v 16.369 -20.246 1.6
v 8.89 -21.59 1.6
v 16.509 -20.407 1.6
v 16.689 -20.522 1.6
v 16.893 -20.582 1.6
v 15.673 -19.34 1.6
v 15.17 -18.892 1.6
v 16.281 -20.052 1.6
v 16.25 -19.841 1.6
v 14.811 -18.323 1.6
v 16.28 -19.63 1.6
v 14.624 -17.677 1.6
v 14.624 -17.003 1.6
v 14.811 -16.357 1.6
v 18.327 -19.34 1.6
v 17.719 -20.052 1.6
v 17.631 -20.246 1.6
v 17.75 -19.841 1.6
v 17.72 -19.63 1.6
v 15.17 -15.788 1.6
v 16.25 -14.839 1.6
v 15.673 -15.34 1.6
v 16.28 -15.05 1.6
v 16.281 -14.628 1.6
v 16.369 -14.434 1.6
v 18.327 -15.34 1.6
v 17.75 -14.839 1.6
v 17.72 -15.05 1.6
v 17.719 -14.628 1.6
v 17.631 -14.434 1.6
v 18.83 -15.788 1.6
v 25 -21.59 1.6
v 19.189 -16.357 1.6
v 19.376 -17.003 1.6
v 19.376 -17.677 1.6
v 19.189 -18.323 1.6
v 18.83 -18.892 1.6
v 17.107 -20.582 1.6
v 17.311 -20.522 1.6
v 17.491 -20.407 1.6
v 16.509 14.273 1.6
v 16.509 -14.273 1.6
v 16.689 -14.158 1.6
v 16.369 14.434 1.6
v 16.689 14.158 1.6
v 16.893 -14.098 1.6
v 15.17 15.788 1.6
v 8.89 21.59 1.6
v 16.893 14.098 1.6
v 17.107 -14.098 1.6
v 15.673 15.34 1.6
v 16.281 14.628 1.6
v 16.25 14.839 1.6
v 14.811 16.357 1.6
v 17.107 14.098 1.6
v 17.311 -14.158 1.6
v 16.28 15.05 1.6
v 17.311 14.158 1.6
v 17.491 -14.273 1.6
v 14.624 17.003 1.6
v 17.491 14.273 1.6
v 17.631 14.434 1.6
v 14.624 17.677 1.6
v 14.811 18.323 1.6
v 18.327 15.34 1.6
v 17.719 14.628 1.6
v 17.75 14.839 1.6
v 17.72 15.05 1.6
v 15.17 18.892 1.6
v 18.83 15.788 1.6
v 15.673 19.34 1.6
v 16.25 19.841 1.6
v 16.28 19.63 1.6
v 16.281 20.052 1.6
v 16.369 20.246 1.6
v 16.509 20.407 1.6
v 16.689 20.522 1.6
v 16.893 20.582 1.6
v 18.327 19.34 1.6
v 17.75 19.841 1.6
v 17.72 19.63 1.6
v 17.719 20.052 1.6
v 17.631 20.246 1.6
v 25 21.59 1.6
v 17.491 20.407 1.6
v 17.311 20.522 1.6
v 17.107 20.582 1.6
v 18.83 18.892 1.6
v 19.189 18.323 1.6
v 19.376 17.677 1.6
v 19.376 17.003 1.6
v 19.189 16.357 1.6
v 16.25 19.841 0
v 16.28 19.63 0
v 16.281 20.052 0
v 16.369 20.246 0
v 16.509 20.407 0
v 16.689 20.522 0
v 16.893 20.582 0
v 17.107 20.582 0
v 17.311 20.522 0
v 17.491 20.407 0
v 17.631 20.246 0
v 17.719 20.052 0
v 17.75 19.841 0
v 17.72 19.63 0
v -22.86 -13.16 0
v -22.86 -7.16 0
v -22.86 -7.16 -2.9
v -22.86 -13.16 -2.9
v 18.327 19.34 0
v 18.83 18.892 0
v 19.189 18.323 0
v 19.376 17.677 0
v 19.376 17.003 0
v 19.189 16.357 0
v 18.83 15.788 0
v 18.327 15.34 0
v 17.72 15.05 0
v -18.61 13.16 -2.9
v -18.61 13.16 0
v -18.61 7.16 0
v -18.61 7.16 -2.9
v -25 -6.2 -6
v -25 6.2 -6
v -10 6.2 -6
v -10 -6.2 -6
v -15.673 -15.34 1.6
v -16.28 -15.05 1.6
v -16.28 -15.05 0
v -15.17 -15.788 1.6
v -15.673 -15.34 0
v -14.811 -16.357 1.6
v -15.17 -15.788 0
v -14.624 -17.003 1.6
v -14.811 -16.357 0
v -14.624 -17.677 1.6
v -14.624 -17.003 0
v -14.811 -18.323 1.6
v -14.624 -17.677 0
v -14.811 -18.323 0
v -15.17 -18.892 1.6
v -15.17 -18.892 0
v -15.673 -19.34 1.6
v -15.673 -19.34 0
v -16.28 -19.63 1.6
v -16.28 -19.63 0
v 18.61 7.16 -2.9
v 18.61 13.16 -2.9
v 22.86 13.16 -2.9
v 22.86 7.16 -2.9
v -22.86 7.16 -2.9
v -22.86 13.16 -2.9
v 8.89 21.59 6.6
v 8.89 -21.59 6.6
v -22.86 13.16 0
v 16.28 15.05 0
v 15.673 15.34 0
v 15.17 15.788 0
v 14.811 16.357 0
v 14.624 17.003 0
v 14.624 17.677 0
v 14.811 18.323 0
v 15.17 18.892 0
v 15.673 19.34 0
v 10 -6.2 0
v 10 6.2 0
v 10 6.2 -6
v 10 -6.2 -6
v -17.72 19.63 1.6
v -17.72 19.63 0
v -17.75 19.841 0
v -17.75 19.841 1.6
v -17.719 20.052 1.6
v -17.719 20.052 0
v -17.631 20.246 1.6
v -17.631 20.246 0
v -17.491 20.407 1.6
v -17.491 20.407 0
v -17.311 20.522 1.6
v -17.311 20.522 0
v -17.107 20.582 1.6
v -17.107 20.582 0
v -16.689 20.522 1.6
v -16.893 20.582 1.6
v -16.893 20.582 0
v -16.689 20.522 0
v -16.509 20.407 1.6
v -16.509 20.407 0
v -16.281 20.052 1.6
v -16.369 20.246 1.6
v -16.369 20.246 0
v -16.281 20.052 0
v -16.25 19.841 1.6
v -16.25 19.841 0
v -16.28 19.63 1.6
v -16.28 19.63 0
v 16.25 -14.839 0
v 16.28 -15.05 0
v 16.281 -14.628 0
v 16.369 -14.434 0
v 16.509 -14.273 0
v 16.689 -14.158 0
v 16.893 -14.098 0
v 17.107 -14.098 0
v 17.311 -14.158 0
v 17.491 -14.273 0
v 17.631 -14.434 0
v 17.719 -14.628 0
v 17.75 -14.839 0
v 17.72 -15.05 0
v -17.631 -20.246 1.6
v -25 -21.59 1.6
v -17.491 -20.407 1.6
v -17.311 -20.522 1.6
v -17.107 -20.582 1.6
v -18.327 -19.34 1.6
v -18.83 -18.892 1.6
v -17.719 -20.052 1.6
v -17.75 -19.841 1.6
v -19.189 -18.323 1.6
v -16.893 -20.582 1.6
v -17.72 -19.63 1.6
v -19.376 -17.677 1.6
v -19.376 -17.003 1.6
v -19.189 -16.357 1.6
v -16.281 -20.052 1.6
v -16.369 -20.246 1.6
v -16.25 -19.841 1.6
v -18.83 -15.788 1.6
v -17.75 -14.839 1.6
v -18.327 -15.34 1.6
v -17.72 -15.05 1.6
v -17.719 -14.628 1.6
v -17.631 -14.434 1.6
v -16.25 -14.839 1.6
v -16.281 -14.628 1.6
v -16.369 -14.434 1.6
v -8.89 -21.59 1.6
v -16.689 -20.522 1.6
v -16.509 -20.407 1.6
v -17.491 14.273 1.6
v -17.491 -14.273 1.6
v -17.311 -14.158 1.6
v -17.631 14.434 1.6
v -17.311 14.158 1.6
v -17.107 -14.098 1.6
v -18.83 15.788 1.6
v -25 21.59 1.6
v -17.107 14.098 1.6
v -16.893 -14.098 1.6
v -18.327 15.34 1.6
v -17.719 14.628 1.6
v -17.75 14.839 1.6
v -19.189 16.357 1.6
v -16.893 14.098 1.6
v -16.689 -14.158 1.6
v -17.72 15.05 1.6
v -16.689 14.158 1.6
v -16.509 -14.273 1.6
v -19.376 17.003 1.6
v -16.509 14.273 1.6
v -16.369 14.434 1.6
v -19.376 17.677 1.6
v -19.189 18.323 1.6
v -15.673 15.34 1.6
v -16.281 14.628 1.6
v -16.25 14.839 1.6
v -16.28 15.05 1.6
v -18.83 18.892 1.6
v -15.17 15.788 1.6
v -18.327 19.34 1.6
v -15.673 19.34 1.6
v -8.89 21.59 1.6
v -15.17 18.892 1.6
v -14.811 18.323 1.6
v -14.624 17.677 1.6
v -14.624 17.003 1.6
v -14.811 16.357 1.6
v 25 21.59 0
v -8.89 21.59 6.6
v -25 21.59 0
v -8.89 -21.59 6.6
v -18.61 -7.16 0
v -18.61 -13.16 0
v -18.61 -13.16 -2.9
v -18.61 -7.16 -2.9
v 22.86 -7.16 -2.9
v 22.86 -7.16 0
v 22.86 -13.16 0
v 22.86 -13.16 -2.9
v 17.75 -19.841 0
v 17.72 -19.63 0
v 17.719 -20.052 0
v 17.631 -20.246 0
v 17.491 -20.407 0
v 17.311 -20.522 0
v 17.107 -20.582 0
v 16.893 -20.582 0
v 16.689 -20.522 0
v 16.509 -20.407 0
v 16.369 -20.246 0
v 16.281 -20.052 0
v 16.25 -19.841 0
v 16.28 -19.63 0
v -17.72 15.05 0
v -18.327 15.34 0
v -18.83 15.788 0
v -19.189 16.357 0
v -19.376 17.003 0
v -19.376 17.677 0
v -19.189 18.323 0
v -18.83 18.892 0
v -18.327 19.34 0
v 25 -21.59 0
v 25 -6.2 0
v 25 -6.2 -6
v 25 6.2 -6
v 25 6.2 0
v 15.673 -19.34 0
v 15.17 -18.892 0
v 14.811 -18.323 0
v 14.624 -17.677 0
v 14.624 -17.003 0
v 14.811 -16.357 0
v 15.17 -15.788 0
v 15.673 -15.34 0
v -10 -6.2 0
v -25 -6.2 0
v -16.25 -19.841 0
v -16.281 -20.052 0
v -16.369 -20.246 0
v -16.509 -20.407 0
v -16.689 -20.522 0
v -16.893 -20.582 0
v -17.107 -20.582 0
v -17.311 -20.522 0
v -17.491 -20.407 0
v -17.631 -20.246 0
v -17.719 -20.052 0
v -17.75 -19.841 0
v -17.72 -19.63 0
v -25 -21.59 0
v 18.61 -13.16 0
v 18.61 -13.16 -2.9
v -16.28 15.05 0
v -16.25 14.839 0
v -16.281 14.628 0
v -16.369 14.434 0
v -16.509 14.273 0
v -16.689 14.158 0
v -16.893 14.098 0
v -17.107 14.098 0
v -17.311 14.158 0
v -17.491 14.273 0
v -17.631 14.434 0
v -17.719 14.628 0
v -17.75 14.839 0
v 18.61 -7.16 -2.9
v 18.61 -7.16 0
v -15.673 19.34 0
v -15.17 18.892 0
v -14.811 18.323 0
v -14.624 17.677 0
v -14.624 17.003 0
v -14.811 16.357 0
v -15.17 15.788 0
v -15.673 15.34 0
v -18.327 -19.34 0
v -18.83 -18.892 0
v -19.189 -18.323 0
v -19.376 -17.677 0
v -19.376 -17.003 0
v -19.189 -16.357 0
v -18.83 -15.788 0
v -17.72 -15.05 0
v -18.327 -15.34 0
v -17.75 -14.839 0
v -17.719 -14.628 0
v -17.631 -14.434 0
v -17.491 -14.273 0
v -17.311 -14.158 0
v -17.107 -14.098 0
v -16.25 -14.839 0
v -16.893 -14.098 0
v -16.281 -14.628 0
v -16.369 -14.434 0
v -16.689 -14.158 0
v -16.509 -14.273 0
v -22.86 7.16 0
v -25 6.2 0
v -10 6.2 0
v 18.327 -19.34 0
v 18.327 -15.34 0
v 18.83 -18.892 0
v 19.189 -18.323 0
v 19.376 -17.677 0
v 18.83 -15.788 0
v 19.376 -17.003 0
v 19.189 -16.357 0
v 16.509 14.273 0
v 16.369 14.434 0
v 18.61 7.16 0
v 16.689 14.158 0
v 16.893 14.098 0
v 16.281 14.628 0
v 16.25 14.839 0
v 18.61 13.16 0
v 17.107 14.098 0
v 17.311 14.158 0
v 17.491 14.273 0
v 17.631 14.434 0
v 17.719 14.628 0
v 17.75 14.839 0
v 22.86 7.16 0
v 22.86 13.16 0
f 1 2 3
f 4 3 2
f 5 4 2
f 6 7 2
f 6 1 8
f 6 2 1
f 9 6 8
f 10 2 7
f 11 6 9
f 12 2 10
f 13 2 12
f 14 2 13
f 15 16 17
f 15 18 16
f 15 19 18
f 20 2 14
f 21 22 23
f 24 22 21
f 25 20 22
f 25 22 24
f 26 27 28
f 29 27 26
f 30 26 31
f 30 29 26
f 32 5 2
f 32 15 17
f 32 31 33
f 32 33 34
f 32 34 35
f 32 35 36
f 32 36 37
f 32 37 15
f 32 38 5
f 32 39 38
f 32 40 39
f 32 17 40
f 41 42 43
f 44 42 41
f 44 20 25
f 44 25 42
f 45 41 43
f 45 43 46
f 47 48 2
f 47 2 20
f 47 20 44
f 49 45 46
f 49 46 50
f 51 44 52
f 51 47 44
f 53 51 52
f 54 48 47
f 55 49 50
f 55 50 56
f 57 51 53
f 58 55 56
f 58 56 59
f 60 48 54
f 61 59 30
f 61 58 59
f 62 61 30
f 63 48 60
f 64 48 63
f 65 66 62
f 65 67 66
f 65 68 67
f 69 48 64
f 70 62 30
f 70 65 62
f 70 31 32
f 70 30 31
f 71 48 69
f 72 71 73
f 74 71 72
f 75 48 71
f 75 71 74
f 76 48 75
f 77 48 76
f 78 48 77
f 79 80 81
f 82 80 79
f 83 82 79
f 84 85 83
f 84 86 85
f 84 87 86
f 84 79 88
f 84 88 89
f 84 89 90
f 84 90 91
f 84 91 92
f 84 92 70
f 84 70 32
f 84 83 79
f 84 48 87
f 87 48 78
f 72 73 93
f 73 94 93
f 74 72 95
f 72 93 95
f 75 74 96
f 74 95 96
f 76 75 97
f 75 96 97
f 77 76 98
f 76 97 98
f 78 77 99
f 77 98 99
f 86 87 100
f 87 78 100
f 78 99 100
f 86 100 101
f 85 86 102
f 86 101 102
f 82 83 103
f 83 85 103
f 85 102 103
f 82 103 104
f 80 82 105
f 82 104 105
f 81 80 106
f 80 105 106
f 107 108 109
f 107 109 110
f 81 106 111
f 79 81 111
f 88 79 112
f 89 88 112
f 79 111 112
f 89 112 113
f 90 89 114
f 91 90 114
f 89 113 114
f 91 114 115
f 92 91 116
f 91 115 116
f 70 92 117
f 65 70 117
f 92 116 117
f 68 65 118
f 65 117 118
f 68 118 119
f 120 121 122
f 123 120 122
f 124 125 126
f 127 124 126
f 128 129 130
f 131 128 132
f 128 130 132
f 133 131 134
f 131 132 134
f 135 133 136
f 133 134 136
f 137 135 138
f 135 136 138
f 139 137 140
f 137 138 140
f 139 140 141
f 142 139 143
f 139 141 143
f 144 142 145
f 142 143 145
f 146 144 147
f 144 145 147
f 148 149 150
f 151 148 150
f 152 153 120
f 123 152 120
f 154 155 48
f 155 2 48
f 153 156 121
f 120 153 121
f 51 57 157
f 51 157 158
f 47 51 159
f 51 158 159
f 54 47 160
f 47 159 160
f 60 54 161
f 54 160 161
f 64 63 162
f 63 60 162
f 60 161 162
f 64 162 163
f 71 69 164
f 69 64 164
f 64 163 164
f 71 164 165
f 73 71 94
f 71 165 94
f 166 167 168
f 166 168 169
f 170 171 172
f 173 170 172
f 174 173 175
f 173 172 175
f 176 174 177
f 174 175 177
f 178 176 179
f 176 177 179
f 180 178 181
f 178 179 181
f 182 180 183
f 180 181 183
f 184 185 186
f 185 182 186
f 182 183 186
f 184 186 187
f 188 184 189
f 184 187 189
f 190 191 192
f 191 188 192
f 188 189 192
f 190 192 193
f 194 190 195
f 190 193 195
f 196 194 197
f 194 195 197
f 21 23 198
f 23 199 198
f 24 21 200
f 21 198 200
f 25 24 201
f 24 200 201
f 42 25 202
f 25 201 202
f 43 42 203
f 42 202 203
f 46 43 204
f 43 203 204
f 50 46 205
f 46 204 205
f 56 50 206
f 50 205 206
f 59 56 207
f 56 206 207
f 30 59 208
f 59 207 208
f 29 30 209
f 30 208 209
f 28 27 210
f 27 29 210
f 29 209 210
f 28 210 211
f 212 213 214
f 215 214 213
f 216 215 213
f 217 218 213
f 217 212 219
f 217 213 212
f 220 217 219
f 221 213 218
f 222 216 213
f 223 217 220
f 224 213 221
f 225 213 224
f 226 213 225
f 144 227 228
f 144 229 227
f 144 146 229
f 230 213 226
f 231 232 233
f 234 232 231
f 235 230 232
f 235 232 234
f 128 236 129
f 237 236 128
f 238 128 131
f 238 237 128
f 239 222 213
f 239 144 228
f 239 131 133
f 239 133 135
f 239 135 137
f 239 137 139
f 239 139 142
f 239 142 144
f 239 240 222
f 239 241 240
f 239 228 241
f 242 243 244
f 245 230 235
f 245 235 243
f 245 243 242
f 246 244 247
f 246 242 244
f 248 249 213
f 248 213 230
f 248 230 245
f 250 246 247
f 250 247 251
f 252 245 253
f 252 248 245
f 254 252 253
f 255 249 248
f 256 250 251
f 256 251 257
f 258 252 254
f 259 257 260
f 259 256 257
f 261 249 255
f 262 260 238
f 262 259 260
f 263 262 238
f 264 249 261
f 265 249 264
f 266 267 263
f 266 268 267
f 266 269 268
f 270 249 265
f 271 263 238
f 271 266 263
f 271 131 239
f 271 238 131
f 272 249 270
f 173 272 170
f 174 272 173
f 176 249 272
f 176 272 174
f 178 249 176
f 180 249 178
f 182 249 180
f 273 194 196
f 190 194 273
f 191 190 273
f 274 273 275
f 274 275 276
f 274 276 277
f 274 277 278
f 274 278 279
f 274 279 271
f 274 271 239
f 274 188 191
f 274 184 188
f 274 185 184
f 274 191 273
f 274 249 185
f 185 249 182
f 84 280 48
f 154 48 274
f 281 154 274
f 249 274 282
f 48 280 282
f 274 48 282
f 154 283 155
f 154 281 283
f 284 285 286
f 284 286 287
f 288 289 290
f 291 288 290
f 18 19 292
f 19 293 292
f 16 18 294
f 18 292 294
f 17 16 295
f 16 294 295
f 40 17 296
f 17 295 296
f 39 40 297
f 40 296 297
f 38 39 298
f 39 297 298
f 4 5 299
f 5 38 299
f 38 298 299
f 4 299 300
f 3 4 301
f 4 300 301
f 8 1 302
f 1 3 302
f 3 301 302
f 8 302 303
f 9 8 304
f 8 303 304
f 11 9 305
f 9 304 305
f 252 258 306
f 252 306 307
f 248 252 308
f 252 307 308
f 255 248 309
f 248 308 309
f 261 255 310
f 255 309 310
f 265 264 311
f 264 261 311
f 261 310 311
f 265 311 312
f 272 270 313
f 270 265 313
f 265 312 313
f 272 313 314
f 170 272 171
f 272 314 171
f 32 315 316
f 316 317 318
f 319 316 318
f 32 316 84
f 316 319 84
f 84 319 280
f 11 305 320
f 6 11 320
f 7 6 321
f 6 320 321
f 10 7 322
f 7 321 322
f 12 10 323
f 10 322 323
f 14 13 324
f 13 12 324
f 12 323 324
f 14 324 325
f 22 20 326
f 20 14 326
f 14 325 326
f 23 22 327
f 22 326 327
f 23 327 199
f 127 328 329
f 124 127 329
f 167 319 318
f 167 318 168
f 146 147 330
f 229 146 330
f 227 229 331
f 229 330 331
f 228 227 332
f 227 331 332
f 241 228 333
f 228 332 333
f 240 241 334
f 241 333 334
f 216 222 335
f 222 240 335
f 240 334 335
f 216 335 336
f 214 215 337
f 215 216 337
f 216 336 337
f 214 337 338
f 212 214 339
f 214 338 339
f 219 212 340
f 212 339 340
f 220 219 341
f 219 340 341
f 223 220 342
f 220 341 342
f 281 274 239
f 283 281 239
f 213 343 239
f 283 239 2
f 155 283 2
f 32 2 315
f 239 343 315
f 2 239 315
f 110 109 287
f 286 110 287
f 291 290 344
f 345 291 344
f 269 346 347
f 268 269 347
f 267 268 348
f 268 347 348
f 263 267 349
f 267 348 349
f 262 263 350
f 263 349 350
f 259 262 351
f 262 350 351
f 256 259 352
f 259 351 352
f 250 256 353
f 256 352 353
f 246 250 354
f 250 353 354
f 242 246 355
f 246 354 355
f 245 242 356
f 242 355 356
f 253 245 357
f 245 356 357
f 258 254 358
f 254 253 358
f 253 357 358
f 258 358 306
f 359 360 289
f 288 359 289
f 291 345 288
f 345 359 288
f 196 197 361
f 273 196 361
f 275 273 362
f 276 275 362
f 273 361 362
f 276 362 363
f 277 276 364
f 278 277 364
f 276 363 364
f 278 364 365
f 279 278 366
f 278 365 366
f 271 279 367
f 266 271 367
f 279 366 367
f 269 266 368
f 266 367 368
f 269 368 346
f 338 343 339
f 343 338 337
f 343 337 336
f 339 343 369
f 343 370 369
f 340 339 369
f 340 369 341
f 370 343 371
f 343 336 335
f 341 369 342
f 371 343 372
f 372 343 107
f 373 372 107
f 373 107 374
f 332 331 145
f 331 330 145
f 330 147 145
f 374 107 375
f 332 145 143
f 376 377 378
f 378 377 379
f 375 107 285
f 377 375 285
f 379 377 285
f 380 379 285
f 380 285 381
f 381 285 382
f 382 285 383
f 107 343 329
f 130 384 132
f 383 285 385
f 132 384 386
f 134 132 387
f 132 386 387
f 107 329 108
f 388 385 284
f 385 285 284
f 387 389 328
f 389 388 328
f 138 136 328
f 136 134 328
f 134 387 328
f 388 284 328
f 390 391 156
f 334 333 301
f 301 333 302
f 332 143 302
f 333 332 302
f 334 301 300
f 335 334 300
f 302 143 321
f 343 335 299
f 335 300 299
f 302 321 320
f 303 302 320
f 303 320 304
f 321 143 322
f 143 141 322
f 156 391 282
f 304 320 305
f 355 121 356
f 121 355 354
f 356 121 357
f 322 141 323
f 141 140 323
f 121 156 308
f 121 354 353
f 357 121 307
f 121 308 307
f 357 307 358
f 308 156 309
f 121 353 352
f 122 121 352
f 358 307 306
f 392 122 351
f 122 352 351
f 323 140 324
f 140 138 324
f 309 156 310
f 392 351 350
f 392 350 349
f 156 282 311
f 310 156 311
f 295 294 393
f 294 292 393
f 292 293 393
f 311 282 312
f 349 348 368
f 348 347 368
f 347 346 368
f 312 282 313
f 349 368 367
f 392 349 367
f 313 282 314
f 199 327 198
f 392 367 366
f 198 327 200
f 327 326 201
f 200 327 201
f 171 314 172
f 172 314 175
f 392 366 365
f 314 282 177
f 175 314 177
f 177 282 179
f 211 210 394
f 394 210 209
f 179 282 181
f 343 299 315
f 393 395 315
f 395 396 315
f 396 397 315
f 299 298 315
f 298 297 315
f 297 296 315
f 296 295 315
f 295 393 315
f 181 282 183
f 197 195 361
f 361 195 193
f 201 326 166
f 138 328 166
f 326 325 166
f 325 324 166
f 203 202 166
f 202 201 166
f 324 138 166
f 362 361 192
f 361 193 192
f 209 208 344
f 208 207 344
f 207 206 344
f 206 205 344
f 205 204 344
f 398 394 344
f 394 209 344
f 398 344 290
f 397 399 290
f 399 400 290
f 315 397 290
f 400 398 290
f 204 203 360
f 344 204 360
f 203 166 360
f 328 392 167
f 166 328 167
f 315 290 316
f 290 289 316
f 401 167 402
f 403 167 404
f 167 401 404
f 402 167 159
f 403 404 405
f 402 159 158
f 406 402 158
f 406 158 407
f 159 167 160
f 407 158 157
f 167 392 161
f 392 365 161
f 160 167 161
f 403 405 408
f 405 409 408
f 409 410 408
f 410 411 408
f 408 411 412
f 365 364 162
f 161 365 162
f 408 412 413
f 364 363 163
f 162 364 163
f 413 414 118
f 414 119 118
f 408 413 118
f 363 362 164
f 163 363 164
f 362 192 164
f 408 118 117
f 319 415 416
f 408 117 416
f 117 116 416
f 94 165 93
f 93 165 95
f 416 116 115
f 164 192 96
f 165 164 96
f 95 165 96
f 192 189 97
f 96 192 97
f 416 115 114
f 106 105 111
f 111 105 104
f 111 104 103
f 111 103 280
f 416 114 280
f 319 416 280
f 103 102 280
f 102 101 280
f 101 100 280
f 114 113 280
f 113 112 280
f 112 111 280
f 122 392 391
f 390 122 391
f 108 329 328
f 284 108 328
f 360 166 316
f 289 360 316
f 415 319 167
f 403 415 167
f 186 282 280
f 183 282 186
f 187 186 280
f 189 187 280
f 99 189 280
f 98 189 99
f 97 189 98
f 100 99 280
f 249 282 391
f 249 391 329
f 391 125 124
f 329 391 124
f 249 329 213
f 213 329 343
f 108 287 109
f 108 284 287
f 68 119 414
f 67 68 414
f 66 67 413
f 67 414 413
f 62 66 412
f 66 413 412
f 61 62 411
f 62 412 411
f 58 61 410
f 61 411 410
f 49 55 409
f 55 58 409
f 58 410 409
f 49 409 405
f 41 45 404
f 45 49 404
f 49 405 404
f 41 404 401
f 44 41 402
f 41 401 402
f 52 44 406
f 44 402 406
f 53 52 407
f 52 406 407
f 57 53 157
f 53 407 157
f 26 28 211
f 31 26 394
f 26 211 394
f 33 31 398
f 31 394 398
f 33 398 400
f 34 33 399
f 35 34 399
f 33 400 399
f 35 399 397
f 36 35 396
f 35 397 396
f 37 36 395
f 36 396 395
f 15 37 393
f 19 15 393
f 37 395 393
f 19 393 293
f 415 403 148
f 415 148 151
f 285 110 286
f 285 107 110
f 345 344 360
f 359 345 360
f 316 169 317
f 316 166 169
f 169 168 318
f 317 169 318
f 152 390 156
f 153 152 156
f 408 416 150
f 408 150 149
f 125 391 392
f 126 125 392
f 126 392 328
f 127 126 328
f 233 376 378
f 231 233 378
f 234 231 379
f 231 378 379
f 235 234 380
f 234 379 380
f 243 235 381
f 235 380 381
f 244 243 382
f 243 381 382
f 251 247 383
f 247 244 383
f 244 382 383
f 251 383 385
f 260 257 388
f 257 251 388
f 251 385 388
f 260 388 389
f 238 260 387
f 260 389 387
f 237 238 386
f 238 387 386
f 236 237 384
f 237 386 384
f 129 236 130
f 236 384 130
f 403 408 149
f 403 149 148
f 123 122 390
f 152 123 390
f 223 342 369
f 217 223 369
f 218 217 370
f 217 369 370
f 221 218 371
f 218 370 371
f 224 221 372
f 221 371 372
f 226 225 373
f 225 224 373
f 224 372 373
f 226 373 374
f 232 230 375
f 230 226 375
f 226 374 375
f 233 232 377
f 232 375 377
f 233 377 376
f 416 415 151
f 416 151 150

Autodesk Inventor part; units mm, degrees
ref_plane "YZ Plane" through (0, 0, 0) normal (1, 0, 0) x (0, 1, 0)
ref_plane "XZ Plane" through (0, 0, 0) normal (0, 1, 0) x (-1, 0, 0)
ref_plane "XY Plane" through (0, 0, 0) normal (0, 0, 1) x (1, 0, 0)
sketch "スケッチ1" plane through (0, 0, 0) normal (0, 0, 1) x (1, 0, 0)
  line L0 (-25, -21.59) -> (25, -21.59)
  line L1 (25, -21.59) -> (25, 21.59)
  line L2 (25, 21.59) -> (-25, 21.59)
  line L3 (-25, 21.59) -> (-25, -21.59)
  line L4 (-25, -21.59) -> (25, 21.59) construction
  line L5 (25, -21.59) -> (-25, 21.59) construction
  line L6 (-17, -17.34) -> (17, -17.34) construction
  line L7 (17, -17.34) -> (17, 17.34) construction
  line L8 (17, 17.34) -> (-17, 17.34) construction
  line L9 (-17, 17.34) -> (-17, -17.34) construction
  line L10 (-17, -17.34) -> (17, 17.34) construction
  line L11 (17, -17.34) -> (-17, 17.34) construction
  line L12 (-25, 6.2) -> (-10, 6.2)
  line L13 (-10, 6.2) -> (-10, -6.2)
  line L14 (-10, -6.2) -> (-25, -6.2)
  line L15 (-25, 0) -> (25, 0) construction
  line L16 (0, -21.59) -> (0, 21.59) construction
  line L17 (25, 6.2) -> (10, 6.2)
  line L18 (10, 6.2) -> (10, -6.2)
  line L19 (10, -6.2) -> (25, -6.2)
  line L20 (-8.89, -21.59) -> (8.89, -21.59)
  line L21 (8.89, -21.59) -> (8.89, 21.59)
  line L22 (8.89, 21.59) -> (-8.89, 21.59)
  line L23 (-8.89, 21.59) -> (-8.89, -21.59)
  line L24 (-8.89, -21.59) -> (8.89, 21.59) construction
  line L25 (8.89, -21.59) -> (-8.89, 21.59) construction
  circle A0 centre (17, 17.34) radius 2.4
  arc A1 (16.2801, 15.0505) -> (17.7199, 15.0505) centre (17, 14.84) ccw
  arc A2 (17.7199, 19.6295) -> (16.2801, 19.6295) centre (17, 19.84) ccw
  circle A3 centre (-17, 17.34) radius 2.4
  arc A4 (-16.2801, 19.6295) -> (-17.7199, 19.6295) centre (-17, 19.84) ccw
  arc A5 (-17.7199, 15.0505) -> (-16.2801, 15.0505) centre (-17, 14.84) ccw
  circle A6 centre (17, -17.34) radius 2.4
  arc A7 (16.2801, -19.6295) -> (17.7199, -19.6295) centre (17, -19.84) ccw
  arc A8 (17.7199, -15.0505) -> (16.2801, -15.0505) centre (17, -14.84) ccw
  circle A9 centre (-17, -17.34) radius 2.4
  arc A10 (-16.2801, -15.0505) -> (-17.7199, -15.0505) centre (-17, -14.84) ccw
  arc A11 (-17.7199, -19.6295) -> (-16.2801, -19.6295) centre (-17, -19.84) ccw
  line L26 (-22.86, -13.16) -> (-18.61, -13.16)
  line L27 (-18.61, -13.16) -> (-18.61, -7.16)
  line L28 (-18.61, -7.16) -> (-22.86, -7.16)
  line L29 (-22.86, -7.16) -> (-22.86, -13.16)
  line L30 (-22.86, -13.16) -> (-18.61, -7.16) construction
  line L31 (-18.61, -13.16) -> (-22.86, -7.16) construction
  line L32 (-22.86, 13.16) -> (-18.61, 13.16)
  line L33 (-18.61, 13.16) -> (-18.61, 7.16)
  line L34 (-18.61, 7.16) -> (-22.86, 7.16)
  line L35 (-22.86, 7.16) -> (-22.86, 13.16)
  line L36 (22.86, -13.16) -> (18.61, -13.16)
  line L37 (18.61, -13.16) -> (18.61, -7.16)
  line L38 (18.61, -7.16) -> (22.86, -7.16)
  line L39 (22.86, -7.16) -> (22.86, -13.16)
  line L40 (18.61, 13.16) -> (18.61, 7.16)
  line L41 (22.86, 13.16) -> (18.61, 13.16)
  line L42 (22.86, 7.16) -> (22.86, 13.16)
  line L43 (18.61, 7.16) -> (22.86, 7.16)
  point P0 (0, 0)
  point P1 (-10, 0)
  point P2 (25, 6.2)
  point P3 (25, -6.2)
  point P4 (0, 0)
  point P5 (0, 0)
  point P6 (0, 0)
  point P7 (17, 20.59)
  point P8 (17, 14.09)
  point P9 (-20.735, -10.16)
  point P10 (-22.86, -10.16)
  dimension "d0" = 50
  dimension "d1" = 43.18
  dimension "d2" = 34
  dimension "d3" = 34.68
  dimension "d8" = 15
  dimension "d9" = 12.4
  dimension "d17" = 17.78
  dimension "d18" = 43.18
  dimension "d25" = 16
  dimension "d26" = 4.8
  dimension "d27" = 6.5
  dimension "d28" = 1.5
  dimension "d29" = 1
  dimension "d30" = 8.5
  dimension "d31" = 16
  dimension "d32" = 4.25
  dimension "d33" = 6
  dimension "d34" = 10.16
  dimension "d35" = 22.86
extrude "押し出し1" add sketch "スケッチ1" along normal blind 1.6 contours L3 L14 L13 L12 L2 L23 L0 | L23 L2 L21 L0 | L3 L12 L13 L14 | L21 L2 L1 L17 L18 L19 L0 | L19 L18 L17 L1 | L29 L28 L27 L26 | L32 L33 L34 L35 | L36 L37 L38 L39 | L41 L42 L43 L40
extrude "押し出し2" add sketch "スケッチ1" against normal blind 6 contours L3 L12 L13 L14 | L19 L18 L17 L1
extrude "押し出し3" add sketch "スケッチ1" along normal blind 6.6 contours L23 L2 L21 L0
extrude "Extrusion4" add sketch "スケッチ1" against normal blind 2.9 contours L29 L28 L27 L26 | L32 L33 L34 L35 | L36 L37 L38 L39 | L41 L42 L43 L40
properties part number "SUSTAINA-STRAINGAUGE-SENSING-BOARD" material "Acetal Resin, Black"
